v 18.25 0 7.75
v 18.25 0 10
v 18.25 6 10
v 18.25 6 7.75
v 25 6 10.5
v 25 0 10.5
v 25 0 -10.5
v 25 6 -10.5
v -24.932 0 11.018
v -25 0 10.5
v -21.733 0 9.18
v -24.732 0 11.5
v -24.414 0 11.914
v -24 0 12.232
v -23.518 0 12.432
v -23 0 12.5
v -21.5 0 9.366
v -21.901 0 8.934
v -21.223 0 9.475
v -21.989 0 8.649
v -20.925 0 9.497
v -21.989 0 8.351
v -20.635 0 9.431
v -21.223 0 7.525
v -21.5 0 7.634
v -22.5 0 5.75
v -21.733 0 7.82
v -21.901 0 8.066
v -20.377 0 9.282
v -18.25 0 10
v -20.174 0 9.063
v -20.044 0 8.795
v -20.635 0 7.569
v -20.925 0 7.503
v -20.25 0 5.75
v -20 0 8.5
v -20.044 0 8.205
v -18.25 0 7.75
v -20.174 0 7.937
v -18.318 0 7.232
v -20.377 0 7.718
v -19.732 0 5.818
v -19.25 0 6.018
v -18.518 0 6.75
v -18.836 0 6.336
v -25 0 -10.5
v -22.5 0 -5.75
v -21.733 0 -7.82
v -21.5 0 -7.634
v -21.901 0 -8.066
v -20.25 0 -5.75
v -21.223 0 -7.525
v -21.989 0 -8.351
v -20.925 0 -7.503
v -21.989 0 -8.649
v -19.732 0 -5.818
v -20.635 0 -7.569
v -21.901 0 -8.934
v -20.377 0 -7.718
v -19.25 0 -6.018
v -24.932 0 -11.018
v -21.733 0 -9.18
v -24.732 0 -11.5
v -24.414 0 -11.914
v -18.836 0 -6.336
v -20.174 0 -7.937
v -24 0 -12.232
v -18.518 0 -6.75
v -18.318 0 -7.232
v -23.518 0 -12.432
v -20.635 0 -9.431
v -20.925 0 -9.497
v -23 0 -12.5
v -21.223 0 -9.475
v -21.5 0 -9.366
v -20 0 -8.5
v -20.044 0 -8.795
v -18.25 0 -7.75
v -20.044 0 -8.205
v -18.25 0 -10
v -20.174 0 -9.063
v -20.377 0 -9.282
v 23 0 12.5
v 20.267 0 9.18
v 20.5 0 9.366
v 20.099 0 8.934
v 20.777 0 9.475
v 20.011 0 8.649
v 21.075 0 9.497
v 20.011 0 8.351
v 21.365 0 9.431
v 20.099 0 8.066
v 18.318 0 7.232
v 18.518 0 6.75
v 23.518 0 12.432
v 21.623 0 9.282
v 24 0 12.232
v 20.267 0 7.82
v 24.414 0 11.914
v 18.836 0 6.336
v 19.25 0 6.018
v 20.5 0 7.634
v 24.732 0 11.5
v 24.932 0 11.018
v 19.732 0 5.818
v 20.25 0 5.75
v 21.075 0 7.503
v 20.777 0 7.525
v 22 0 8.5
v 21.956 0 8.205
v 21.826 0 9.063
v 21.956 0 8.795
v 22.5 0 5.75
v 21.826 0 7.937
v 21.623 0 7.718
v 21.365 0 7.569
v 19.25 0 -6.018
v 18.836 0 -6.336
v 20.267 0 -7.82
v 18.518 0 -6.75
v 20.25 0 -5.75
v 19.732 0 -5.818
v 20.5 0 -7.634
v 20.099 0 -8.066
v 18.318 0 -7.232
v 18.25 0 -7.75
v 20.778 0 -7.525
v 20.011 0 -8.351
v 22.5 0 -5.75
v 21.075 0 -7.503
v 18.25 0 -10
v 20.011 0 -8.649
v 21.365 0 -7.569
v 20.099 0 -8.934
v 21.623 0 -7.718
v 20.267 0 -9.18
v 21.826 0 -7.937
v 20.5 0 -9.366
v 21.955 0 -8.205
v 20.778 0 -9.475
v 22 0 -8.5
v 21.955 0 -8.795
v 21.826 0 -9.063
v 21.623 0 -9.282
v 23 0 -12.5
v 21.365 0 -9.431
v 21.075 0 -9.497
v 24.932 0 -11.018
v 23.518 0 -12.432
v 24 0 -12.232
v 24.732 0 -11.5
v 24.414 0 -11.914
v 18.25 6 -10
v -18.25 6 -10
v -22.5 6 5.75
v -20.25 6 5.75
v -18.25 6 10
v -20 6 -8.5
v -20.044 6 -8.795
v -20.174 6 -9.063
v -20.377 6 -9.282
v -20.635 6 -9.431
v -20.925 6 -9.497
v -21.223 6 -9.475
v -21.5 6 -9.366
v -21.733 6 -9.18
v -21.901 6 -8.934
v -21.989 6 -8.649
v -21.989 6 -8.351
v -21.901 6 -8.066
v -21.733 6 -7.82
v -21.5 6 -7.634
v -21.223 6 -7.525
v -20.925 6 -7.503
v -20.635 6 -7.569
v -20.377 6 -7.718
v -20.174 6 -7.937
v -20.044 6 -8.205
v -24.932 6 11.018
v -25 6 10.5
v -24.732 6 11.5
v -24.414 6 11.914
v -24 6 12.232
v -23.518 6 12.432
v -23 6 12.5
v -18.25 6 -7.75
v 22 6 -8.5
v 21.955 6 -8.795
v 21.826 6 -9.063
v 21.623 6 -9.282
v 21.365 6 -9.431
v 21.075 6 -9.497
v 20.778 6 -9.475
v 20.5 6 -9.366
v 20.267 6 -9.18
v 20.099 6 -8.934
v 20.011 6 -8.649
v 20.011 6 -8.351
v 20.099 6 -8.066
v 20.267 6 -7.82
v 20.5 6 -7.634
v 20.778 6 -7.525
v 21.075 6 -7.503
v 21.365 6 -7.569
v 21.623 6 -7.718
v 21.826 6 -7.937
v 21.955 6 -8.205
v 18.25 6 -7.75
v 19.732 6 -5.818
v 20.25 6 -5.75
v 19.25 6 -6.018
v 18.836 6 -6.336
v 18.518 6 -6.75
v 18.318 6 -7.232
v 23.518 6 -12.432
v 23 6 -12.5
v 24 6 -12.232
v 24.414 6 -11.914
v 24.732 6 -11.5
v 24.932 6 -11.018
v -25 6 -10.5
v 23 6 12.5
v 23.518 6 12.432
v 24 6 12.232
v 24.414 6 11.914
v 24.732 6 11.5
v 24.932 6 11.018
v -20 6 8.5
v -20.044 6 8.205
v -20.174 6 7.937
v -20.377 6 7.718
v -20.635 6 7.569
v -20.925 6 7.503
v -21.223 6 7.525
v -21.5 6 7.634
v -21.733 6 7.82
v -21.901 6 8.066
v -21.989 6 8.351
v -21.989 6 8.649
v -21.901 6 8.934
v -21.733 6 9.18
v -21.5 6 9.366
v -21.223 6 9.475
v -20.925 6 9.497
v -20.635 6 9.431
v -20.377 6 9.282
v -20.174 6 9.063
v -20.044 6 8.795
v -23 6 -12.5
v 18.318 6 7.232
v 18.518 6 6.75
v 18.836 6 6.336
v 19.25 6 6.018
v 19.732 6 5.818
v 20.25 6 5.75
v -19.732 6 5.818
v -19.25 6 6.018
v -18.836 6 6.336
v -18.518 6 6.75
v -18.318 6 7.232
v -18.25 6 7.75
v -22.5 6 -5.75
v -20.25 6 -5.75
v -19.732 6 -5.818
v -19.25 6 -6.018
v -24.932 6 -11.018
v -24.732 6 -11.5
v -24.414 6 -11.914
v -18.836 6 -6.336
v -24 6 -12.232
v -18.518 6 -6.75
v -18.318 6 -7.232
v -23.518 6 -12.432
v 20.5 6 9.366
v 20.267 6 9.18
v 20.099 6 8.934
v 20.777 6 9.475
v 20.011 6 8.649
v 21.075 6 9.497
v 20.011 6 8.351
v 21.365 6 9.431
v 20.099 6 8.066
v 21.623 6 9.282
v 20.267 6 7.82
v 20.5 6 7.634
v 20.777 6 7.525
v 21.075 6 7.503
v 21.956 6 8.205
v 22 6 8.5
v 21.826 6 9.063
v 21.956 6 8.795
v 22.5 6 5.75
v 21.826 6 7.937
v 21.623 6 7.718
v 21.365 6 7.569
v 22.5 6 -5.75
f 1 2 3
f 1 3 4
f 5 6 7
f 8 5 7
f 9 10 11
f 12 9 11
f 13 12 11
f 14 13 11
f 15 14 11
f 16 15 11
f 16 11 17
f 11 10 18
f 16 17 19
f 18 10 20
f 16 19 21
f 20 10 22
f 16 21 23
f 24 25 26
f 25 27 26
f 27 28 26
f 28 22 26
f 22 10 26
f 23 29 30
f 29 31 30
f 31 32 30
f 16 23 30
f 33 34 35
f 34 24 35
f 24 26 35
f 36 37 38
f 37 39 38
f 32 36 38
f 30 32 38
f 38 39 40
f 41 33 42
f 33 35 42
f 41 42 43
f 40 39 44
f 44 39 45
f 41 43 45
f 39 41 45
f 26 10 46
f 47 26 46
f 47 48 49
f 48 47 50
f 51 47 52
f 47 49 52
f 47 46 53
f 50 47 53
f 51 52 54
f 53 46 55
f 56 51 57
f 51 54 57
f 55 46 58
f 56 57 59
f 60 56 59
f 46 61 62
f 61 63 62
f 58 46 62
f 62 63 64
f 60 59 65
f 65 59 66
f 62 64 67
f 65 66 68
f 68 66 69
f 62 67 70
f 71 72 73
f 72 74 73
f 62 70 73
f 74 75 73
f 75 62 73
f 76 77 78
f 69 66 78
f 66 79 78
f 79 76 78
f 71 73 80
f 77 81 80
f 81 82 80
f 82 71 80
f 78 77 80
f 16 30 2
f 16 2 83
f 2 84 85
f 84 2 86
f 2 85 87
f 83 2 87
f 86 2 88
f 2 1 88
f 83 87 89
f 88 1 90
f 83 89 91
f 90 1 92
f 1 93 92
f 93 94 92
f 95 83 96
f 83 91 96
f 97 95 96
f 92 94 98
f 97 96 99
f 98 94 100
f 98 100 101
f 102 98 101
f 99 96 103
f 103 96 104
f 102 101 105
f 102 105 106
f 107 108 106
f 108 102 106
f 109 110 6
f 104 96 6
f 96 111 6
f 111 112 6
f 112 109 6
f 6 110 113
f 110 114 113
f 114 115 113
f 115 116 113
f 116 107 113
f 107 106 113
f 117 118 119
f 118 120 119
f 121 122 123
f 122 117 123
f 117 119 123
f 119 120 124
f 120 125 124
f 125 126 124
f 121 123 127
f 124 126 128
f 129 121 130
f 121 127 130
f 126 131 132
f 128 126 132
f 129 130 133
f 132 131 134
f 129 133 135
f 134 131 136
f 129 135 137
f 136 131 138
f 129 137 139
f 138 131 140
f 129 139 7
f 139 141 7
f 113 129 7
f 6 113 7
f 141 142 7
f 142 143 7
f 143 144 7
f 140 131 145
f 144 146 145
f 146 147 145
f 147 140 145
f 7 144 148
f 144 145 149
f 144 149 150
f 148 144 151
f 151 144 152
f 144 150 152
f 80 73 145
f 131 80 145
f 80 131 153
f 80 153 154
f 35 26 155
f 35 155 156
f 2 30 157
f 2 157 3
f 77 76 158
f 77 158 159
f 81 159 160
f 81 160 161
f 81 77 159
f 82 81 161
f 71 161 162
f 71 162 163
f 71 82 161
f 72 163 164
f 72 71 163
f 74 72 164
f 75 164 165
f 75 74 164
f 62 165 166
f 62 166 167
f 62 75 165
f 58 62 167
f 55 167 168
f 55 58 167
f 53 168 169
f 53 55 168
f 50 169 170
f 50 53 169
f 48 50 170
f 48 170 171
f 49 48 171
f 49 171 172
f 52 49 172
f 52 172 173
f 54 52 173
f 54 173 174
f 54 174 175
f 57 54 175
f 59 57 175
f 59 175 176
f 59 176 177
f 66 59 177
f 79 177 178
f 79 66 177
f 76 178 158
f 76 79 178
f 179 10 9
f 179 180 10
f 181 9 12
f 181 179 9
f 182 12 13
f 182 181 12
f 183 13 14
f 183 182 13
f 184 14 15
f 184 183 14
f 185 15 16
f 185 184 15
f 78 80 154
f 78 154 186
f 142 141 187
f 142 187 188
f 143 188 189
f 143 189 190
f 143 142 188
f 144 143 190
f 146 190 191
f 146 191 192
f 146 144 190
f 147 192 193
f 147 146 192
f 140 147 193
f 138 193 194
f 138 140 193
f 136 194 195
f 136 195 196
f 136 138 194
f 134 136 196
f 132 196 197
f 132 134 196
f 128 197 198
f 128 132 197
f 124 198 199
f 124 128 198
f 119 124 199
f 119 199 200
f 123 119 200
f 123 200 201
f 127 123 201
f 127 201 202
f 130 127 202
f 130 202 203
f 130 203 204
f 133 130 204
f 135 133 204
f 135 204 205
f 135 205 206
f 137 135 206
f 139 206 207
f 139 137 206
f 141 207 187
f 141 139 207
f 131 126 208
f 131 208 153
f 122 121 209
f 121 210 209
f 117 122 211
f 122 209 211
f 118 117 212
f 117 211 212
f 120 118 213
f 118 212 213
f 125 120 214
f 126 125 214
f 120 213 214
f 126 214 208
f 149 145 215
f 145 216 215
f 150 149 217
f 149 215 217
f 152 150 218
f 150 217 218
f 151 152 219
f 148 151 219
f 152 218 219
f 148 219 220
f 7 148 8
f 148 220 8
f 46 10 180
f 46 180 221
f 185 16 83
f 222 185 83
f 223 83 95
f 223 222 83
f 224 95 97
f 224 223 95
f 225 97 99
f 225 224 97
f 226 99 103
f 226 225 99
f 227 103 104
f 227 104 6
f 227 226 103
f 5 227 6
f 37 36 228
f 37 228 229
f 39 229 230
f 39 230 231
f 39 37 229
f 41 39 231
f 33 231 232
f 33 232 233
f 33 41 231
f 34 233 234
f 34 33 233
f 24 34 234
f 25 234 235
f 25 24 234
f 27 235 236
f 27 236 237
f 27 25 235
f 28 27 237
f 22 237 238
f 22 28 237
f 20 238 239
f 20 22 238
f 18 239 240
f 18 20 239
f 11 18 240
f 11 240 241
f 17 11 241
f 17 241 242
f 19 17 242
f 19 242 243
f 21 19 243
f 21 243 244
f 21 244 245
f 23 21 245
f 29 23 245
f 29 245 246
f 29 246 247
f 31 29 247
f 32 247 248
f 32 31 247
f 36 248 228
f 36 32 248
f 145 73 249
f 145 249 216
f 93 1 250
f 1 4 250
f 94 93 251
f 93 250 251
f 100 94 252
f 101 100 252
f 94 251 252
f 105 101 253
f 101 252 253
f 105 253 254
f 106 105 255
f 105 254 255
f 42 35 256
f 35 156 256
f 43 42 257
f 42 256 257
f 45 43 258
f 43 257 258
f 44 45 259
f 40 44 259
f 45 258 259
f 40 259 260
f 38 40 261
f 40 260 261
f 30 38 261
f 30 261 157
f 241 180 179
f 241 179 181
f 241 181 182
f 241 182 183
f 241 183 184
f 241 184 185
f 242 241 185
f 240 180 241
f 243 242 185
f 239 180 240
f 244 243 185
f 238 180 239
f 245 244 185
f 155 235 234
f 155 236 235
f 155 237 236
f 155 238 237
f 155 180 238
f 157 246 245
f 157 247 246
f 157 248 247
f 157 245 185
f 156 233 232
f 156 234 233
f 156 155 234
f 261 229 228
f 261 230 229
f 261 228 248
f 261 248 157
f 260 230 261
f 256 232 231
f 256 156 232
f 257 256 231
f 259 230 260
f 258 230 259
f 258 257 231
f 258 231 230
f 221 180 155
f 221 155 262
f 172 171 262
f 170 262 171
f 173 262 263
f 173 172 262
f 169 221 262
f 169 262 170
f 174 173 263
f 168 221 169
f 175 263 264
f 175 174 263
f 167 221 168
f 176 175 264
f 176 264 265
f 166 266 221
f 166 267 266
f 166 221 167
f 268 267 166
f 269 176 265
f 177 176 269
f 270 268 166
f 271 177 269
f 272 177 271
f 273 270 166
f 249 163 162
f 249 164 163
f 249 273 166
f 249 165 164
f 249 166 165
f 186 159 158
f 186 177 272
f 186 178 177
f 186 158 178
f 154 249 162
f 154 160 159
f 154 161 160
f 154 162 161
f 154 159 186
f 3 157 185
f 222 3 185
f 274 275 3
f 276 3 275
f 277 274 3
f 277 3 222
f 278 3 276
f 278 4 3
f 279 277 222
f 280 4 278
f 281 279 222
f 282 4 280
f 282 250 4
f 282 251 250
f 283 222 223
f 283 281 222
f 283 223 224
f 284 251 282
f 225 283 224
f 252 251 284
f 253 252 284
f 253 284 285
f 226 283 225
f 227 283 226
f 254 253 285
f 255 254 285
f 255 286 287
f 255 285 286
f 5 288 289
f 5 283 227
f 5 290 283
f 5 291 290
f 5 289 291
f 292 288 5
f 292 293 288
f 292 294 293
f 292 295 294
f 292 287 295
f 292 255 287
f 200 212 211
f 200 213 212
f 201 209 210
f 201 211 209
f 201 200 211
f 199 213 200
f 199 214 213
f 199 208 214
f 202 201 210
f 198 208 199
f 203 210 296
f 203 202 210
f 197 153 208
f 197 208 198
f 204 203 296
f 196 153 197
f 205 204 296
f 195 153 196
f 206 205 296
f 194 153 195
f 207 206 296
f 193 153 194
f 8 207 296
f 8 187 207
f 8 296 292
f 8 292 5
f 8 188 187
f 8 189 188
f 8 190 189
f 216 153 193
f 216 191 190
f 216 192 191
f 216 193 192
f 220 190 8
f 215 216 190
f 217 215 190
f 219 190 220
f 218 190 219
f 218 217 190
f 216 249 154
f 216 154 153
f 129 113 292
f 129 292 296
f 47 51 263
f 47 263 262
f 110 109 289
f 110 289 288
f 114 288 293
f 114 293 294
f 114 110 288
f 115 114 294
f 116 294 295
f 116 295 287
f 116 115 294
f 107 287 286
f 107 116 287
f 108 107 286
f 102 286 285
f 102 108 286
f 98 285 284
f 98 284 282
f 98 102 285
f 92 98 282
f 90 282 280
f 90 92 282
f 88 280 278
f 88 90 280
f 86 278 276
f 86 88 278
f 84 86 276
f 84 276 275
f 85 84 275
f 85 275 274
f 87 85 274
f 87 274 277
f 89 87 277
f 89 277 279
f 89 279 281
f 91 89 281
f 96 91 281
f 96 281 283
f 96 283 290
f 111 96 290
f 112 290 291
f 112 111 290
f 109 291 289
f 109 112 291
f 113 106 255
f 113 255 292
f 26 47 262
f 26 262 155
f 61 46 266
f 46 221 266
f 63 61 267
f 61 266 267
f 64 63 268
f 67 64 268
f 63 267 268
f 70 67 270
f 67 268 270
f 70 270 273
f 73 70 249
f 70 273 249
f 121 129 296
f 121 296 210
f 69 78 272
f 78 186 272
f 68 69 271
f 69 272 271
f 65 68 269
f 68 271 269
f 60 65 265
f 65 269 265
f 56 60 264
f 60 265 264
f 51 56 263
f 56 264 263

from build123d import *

# Parameters (mm, degrees)
SKETCH1_W           = 50
SKETCH1_H           = 25
BOSS_EXTRUDE1_DEPTH = 6
SKETCH2_R           = 1
SKETCH2_R_2         = 0.999812185
CUT_EXTRUDE1_DEPTH  = 6
CUT_EXTRUDE2_DEPTH  = 6
FILLET1_R           = 2


with BuildPart() as part:
    # Sketch1 → Boss-Extrude1 (new body)
    with BuildSketch(Plane(origin=(0, 0, 0), x_dir=(1, 0, 0), z_dir=(0, 1, 0))):
        Rectangle(SKETCH1_W, SKETCH1_H)
    extrude(amount=BOSS_EXTRUDE1_DEPTH)

    # Sketch2 → Cut-Extrude1 (cut)
    with BuildSketch(Plane(origin=(0, 0, 0), x_dir=(1, 0, 0), z_dir=(0, 1, 0))):
        with Locations((-21, 8.5)):
            Circle(SKETCH2_R)
        with Locations((21, 8.5)):
            Circle(SKETCH2_R_2)
        with Locations((-21, -8.5)):
            Circle(SKETCH2_R)
        with Locations((21, -8.5)):
            Circle(SKETCH2_R)
    extrude(amount=CUT_EXTRUDE1_DEPTH, mode=Mode.SUBTRACT)

    # Sketch3 → Cut-Extrude2 (cut)
    with BuildSketch(Plane(origin=(0, 0, 0), x_dir=(1, 0, 0), z_dir=(0, 1, 0))):
        Polygon((-22.5, 5.75), (-22.5, -5.75), (-18.25, -5.75), (-18.25, -10), (18.25, -10), (18.25, -5.75), (22.5, -5.75), (22.5, 5.75), (18.25, 5.75), (18.25, 10), (-18.25, 10), (-18.25, 5.75), align=None)
    extrude(amount=CUT_EXTRUDE2_DEPTH, mode=Mode.SUBTRACT)

    # Fillet1
    fillet1_edges = [part.edges().sort_by_distance(p)[0] for p in [
        (-18.25, 3, -5.75),
        (-18.25, 3, 5.75),
        (18.25, 3, 5.75),
        (18.25, 3, -5.75),
        (25, 3, 12.5),
        (-25, 3, 12.5),
        (-25, 3, -12.5),
        (25, 3, -12.5),
    ]]
    fillet(fillet1_edges, radius=FILLET1_R)


solid = part.part
